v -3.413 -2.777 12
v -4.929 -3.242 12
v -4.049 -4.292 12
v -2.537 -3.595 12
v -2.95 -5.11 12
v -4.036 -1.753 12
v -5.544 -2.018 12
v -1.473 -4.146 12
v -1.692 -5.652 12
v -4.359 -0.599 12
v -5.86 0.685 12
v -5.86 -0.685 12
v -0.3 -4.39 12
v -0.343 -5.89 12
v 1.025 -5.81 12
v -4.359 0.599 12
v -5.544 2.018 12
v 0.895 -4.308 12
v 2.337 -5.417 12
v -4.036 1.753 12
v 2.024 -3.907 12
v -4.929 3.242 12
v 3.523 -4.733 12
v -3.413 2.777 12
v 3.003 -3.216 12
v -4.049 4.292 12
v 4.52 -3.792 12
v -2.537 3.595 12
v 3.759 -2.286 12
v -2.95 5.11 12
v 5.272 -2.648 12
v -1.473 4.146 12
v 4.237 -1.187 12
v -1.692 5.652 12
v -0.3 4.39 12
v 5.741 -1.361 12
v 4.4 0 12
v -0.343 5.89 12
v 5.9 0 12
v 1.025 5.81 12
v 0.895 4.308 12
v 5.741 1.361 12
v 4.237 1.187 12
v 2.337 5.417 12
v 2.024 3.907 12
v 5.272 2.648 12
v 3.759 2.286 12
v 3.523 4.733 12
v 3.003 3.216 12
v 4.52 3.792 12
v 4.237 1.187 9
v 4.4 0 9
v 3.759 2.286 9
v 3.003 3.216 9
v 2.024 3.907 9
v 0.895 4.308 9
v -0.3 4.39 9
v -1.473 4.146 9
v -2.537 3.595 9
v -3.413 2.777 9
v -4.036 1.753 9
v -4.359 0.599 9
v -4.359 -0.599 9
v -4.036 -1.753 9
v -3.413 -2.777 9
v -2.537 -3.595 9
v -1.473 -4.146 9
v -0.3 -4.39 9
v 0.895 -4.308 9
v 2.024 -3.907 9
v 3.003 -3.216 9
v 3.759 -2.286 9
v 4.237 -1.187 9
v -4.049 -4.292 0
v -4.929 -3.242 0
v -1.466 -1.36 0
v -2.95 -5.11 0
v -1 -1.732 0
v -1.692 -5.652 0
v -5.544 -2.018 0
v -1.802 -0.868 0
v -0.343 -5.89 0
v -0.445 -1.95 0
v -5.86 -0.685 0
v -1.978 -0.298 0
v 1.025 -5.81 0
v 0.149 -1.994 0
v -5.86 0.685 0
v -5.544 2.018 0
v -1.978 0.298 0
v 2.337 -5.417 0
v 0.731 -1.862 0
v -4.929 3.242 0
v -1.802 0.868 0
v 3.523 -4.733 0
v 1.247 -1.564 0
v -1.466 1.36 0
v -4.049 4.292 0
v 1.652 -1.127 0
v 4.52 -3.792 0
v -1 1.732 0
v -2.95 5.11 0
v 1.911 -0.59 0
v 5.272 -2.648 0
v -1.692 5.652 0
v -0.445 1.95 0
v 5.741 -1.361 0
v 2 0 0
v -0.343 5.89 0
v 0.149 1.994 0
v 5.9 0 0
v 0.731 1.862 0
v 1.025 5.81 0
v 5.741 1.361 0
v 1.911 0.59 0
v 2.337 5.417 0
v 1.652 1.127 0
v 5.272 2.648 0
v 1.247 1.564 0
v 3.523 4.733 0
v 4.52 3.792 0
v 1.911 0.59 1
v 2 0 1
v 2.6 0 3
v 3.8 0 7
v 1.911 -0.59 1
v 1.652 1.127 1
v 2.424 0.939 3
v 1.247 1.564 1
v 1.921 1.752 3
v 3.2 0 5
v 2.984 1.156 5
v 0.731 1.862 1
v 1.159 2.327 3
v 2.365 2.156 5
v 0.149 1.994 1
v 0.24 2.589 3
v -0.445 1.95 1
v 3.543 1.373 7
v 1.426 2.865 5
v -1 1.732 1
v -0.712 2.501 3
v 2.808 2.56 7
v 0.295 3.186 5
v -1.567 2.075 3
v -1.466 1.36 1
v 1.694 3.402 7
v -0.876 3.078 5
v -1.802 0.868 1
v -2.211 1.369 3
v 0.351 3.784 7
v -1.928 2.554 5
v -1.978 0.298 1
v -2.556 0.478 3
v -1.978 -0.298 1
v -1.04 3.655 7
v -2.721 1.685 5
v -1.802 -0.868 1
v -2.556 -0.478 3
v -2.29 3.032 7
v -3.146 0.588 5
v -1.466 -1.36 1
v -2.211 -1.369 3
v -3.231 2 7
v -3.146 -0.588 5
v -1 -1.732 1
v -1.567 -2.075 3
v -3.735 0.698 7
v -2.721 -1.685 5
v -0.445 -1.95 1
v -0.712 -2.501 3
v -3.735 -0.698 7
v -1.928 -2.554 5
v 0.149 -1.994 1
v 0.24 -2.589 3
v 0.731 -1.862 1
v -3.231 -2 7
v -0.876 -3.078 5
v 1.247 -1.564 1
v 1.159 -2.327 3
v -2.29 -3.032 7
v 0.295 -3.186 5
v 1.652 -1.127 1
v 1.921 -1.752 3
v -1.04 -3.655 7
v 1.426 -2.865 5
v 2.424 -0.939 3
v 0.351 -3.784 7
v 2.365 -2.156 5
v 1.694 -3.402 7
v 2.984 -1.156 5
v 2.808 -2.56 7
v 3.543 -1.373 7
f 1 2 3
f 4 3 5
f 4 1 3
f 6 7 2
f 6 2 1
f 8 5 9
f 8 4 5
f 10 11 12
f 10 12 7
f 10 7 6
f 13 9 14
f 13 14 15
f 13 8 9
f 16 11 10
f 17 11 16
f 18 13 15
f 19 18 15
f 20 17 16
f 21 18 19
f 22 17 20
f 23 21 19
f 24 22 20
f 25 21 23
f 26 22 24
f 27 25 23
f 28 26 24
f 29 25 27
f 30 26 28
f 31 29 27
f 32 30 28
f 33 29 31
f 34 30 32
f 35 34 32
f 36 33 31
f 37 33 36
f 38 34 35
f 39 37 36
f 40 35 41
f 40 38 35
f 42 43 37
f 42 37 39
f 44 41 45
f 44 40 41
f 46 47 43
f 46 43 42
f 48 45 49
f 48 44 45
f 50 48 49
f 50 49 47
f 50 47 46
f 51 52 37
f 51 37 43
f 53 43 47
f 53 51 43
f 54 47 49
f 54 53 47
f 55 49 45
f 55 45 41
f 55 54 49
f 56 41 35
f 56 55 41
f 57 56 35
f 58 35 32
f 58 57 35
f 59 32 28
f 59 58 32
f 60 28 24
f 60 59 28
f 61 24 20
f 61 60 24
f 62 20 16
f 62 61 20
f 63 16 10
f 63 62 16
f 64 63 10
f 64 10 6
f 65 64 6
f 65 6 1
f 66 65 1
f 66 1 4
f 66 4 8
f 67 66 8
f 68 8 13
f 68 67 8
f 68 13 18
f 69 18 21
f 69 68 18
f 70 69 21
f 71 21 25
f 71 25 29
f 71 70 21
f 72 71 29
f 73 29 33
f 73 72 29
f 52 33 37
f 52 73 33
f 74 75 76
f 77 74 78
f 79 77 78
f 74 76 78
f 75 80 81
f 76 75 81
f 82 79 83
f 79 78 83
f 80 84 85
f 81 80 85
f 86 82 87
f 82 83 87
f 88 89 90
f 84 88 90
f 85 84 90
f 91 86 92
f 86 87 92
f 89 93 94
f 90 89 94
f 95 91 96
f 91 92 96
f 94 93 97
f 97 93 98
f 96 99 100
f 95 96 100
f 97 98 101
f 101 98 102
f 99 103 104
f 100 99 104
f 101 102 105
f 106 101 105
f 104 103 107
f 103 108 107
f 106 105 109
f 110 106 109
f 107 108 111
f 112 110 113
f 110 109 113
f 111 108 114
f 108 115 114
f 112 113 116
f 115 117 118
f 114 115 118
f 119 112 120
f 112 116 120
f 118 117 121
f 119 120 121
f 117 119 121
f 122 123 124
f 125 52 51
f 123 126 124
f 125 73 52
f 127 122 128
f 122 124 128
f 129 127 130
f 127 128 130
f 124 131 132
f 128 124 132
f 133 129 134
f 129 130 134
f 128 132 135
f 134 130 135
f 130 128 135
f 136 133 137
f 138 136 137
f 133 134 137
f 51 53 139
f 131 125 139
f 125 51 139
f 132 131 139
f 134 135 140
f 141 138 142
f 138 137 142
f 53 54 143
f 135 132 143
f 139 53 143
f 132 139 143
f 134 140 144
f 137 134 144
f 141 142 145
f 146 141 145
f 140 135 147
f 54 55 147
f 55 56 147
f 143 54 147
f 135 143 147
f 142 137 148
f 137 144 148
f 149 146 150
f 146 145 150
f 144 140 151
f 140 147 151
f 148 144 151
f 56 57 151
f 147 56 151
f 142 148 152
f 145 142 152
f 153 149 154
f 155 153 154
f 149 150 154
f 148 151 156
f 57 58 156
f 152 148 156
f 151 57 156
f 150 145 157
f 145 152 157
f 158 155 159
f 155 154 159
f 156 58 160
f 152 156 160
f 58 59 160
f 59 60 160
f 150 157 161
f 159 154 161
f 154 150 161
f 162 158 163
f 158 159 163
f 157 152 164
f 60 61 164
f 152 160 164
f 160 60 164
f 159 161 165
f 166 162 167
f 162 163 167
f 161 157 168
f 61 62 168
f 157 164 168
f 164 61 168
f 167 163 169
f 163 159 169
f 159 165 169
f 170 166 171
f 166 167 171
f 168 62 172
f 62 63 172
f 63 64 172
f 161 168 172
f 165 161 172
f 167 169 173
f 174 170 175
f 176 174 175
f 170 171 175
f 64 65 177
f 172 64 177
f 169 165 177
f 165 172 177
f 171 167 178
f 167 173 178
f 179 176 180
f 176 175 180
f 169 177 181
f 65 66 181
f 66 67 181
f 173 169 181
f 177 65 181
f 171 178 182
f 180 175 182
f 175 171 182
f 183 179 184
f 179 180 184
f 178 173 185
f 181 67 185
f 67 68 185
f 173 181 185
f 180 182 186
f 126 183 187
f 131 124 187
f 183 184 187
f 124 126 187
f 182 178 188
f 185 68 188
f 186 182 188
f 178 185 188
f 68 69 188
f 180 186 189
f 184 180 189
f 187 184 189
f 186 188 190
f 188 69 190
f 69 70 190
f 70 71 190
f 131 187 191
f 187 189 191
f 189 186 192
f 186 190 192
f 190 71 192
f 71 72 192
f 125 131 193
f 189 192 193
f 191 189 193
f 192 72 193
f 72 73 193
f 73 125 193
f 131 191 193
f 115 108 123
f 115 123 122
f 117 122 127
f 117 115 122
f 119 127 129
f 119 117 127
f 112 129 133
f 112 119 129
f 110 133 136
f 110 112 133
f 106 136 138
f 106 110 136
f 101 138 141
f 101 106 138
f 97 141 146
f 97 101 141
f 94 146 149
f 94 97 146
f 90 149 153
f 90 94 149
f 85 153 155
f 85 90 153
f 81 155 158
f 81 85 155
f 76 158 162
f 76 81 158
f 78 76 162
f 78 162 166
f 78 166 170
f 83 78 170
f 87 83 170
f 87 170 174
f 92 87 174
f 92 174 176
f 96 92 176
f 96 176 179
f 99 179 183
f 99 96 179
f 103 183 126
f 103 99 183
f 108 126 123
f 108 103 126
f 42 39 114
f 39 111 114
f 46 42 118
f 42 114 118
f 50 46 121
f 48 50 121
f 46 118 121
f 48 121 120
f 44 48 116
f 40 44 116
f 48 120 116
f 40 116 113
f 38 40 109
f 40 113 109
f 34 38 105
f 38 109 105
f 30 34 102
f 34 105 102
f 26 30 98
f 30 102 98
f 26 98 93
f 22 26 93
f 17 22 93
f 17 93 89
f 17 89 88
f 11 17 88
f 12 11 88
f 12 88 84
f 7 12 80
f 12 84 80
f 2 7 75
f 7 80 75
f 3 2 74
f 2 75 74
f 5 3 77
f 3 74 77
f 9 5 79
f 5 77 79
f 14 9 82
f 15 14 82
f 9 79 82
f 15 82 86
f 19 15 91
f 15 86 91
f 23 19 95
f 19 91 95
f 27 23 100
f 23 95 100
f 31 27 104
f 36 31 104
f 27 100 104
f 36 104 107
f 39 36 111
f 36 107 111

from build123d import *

# Parameters (mm, degrees)
F0_R        = 5.9
F0_R_2      = 2
F1_DEPTH    = 9
F2_SIZE2    = 2.4
F2_SIZE     = 8
F1_FACE_R   = 5.9
F1_FACE_R_2 = 4.4
F3_DEPTH    = 3


with BuildPart() as f1:
    # F0 (on Top) → F1 (new body)
    with BuildSketch(Plane.XY):
        Circle(F0_R)
        Circle(F0_R_2, mode=Mode.SUBTRACT)
    extrude(amount=F1_DEPTH)

    # F2
    f2_edges = [f1.edges().sort_by_distance(p)[0] for p in [
        (-2, 0, 9),
    ]]
    chamfer(f2_edges, length=F2_SIZE, length2=F2_SIZE2)

    # F1_face (on face) → F3 (join)
    with BuildSketch(Plane.XY.offset(9)):
        Circle(F1_FACE_R)
        Circle(F1_FACE_R_2, mode=Mode.SUBTRACT)
    extrude(amount=F3_DEPTH)


solid = f1.part
